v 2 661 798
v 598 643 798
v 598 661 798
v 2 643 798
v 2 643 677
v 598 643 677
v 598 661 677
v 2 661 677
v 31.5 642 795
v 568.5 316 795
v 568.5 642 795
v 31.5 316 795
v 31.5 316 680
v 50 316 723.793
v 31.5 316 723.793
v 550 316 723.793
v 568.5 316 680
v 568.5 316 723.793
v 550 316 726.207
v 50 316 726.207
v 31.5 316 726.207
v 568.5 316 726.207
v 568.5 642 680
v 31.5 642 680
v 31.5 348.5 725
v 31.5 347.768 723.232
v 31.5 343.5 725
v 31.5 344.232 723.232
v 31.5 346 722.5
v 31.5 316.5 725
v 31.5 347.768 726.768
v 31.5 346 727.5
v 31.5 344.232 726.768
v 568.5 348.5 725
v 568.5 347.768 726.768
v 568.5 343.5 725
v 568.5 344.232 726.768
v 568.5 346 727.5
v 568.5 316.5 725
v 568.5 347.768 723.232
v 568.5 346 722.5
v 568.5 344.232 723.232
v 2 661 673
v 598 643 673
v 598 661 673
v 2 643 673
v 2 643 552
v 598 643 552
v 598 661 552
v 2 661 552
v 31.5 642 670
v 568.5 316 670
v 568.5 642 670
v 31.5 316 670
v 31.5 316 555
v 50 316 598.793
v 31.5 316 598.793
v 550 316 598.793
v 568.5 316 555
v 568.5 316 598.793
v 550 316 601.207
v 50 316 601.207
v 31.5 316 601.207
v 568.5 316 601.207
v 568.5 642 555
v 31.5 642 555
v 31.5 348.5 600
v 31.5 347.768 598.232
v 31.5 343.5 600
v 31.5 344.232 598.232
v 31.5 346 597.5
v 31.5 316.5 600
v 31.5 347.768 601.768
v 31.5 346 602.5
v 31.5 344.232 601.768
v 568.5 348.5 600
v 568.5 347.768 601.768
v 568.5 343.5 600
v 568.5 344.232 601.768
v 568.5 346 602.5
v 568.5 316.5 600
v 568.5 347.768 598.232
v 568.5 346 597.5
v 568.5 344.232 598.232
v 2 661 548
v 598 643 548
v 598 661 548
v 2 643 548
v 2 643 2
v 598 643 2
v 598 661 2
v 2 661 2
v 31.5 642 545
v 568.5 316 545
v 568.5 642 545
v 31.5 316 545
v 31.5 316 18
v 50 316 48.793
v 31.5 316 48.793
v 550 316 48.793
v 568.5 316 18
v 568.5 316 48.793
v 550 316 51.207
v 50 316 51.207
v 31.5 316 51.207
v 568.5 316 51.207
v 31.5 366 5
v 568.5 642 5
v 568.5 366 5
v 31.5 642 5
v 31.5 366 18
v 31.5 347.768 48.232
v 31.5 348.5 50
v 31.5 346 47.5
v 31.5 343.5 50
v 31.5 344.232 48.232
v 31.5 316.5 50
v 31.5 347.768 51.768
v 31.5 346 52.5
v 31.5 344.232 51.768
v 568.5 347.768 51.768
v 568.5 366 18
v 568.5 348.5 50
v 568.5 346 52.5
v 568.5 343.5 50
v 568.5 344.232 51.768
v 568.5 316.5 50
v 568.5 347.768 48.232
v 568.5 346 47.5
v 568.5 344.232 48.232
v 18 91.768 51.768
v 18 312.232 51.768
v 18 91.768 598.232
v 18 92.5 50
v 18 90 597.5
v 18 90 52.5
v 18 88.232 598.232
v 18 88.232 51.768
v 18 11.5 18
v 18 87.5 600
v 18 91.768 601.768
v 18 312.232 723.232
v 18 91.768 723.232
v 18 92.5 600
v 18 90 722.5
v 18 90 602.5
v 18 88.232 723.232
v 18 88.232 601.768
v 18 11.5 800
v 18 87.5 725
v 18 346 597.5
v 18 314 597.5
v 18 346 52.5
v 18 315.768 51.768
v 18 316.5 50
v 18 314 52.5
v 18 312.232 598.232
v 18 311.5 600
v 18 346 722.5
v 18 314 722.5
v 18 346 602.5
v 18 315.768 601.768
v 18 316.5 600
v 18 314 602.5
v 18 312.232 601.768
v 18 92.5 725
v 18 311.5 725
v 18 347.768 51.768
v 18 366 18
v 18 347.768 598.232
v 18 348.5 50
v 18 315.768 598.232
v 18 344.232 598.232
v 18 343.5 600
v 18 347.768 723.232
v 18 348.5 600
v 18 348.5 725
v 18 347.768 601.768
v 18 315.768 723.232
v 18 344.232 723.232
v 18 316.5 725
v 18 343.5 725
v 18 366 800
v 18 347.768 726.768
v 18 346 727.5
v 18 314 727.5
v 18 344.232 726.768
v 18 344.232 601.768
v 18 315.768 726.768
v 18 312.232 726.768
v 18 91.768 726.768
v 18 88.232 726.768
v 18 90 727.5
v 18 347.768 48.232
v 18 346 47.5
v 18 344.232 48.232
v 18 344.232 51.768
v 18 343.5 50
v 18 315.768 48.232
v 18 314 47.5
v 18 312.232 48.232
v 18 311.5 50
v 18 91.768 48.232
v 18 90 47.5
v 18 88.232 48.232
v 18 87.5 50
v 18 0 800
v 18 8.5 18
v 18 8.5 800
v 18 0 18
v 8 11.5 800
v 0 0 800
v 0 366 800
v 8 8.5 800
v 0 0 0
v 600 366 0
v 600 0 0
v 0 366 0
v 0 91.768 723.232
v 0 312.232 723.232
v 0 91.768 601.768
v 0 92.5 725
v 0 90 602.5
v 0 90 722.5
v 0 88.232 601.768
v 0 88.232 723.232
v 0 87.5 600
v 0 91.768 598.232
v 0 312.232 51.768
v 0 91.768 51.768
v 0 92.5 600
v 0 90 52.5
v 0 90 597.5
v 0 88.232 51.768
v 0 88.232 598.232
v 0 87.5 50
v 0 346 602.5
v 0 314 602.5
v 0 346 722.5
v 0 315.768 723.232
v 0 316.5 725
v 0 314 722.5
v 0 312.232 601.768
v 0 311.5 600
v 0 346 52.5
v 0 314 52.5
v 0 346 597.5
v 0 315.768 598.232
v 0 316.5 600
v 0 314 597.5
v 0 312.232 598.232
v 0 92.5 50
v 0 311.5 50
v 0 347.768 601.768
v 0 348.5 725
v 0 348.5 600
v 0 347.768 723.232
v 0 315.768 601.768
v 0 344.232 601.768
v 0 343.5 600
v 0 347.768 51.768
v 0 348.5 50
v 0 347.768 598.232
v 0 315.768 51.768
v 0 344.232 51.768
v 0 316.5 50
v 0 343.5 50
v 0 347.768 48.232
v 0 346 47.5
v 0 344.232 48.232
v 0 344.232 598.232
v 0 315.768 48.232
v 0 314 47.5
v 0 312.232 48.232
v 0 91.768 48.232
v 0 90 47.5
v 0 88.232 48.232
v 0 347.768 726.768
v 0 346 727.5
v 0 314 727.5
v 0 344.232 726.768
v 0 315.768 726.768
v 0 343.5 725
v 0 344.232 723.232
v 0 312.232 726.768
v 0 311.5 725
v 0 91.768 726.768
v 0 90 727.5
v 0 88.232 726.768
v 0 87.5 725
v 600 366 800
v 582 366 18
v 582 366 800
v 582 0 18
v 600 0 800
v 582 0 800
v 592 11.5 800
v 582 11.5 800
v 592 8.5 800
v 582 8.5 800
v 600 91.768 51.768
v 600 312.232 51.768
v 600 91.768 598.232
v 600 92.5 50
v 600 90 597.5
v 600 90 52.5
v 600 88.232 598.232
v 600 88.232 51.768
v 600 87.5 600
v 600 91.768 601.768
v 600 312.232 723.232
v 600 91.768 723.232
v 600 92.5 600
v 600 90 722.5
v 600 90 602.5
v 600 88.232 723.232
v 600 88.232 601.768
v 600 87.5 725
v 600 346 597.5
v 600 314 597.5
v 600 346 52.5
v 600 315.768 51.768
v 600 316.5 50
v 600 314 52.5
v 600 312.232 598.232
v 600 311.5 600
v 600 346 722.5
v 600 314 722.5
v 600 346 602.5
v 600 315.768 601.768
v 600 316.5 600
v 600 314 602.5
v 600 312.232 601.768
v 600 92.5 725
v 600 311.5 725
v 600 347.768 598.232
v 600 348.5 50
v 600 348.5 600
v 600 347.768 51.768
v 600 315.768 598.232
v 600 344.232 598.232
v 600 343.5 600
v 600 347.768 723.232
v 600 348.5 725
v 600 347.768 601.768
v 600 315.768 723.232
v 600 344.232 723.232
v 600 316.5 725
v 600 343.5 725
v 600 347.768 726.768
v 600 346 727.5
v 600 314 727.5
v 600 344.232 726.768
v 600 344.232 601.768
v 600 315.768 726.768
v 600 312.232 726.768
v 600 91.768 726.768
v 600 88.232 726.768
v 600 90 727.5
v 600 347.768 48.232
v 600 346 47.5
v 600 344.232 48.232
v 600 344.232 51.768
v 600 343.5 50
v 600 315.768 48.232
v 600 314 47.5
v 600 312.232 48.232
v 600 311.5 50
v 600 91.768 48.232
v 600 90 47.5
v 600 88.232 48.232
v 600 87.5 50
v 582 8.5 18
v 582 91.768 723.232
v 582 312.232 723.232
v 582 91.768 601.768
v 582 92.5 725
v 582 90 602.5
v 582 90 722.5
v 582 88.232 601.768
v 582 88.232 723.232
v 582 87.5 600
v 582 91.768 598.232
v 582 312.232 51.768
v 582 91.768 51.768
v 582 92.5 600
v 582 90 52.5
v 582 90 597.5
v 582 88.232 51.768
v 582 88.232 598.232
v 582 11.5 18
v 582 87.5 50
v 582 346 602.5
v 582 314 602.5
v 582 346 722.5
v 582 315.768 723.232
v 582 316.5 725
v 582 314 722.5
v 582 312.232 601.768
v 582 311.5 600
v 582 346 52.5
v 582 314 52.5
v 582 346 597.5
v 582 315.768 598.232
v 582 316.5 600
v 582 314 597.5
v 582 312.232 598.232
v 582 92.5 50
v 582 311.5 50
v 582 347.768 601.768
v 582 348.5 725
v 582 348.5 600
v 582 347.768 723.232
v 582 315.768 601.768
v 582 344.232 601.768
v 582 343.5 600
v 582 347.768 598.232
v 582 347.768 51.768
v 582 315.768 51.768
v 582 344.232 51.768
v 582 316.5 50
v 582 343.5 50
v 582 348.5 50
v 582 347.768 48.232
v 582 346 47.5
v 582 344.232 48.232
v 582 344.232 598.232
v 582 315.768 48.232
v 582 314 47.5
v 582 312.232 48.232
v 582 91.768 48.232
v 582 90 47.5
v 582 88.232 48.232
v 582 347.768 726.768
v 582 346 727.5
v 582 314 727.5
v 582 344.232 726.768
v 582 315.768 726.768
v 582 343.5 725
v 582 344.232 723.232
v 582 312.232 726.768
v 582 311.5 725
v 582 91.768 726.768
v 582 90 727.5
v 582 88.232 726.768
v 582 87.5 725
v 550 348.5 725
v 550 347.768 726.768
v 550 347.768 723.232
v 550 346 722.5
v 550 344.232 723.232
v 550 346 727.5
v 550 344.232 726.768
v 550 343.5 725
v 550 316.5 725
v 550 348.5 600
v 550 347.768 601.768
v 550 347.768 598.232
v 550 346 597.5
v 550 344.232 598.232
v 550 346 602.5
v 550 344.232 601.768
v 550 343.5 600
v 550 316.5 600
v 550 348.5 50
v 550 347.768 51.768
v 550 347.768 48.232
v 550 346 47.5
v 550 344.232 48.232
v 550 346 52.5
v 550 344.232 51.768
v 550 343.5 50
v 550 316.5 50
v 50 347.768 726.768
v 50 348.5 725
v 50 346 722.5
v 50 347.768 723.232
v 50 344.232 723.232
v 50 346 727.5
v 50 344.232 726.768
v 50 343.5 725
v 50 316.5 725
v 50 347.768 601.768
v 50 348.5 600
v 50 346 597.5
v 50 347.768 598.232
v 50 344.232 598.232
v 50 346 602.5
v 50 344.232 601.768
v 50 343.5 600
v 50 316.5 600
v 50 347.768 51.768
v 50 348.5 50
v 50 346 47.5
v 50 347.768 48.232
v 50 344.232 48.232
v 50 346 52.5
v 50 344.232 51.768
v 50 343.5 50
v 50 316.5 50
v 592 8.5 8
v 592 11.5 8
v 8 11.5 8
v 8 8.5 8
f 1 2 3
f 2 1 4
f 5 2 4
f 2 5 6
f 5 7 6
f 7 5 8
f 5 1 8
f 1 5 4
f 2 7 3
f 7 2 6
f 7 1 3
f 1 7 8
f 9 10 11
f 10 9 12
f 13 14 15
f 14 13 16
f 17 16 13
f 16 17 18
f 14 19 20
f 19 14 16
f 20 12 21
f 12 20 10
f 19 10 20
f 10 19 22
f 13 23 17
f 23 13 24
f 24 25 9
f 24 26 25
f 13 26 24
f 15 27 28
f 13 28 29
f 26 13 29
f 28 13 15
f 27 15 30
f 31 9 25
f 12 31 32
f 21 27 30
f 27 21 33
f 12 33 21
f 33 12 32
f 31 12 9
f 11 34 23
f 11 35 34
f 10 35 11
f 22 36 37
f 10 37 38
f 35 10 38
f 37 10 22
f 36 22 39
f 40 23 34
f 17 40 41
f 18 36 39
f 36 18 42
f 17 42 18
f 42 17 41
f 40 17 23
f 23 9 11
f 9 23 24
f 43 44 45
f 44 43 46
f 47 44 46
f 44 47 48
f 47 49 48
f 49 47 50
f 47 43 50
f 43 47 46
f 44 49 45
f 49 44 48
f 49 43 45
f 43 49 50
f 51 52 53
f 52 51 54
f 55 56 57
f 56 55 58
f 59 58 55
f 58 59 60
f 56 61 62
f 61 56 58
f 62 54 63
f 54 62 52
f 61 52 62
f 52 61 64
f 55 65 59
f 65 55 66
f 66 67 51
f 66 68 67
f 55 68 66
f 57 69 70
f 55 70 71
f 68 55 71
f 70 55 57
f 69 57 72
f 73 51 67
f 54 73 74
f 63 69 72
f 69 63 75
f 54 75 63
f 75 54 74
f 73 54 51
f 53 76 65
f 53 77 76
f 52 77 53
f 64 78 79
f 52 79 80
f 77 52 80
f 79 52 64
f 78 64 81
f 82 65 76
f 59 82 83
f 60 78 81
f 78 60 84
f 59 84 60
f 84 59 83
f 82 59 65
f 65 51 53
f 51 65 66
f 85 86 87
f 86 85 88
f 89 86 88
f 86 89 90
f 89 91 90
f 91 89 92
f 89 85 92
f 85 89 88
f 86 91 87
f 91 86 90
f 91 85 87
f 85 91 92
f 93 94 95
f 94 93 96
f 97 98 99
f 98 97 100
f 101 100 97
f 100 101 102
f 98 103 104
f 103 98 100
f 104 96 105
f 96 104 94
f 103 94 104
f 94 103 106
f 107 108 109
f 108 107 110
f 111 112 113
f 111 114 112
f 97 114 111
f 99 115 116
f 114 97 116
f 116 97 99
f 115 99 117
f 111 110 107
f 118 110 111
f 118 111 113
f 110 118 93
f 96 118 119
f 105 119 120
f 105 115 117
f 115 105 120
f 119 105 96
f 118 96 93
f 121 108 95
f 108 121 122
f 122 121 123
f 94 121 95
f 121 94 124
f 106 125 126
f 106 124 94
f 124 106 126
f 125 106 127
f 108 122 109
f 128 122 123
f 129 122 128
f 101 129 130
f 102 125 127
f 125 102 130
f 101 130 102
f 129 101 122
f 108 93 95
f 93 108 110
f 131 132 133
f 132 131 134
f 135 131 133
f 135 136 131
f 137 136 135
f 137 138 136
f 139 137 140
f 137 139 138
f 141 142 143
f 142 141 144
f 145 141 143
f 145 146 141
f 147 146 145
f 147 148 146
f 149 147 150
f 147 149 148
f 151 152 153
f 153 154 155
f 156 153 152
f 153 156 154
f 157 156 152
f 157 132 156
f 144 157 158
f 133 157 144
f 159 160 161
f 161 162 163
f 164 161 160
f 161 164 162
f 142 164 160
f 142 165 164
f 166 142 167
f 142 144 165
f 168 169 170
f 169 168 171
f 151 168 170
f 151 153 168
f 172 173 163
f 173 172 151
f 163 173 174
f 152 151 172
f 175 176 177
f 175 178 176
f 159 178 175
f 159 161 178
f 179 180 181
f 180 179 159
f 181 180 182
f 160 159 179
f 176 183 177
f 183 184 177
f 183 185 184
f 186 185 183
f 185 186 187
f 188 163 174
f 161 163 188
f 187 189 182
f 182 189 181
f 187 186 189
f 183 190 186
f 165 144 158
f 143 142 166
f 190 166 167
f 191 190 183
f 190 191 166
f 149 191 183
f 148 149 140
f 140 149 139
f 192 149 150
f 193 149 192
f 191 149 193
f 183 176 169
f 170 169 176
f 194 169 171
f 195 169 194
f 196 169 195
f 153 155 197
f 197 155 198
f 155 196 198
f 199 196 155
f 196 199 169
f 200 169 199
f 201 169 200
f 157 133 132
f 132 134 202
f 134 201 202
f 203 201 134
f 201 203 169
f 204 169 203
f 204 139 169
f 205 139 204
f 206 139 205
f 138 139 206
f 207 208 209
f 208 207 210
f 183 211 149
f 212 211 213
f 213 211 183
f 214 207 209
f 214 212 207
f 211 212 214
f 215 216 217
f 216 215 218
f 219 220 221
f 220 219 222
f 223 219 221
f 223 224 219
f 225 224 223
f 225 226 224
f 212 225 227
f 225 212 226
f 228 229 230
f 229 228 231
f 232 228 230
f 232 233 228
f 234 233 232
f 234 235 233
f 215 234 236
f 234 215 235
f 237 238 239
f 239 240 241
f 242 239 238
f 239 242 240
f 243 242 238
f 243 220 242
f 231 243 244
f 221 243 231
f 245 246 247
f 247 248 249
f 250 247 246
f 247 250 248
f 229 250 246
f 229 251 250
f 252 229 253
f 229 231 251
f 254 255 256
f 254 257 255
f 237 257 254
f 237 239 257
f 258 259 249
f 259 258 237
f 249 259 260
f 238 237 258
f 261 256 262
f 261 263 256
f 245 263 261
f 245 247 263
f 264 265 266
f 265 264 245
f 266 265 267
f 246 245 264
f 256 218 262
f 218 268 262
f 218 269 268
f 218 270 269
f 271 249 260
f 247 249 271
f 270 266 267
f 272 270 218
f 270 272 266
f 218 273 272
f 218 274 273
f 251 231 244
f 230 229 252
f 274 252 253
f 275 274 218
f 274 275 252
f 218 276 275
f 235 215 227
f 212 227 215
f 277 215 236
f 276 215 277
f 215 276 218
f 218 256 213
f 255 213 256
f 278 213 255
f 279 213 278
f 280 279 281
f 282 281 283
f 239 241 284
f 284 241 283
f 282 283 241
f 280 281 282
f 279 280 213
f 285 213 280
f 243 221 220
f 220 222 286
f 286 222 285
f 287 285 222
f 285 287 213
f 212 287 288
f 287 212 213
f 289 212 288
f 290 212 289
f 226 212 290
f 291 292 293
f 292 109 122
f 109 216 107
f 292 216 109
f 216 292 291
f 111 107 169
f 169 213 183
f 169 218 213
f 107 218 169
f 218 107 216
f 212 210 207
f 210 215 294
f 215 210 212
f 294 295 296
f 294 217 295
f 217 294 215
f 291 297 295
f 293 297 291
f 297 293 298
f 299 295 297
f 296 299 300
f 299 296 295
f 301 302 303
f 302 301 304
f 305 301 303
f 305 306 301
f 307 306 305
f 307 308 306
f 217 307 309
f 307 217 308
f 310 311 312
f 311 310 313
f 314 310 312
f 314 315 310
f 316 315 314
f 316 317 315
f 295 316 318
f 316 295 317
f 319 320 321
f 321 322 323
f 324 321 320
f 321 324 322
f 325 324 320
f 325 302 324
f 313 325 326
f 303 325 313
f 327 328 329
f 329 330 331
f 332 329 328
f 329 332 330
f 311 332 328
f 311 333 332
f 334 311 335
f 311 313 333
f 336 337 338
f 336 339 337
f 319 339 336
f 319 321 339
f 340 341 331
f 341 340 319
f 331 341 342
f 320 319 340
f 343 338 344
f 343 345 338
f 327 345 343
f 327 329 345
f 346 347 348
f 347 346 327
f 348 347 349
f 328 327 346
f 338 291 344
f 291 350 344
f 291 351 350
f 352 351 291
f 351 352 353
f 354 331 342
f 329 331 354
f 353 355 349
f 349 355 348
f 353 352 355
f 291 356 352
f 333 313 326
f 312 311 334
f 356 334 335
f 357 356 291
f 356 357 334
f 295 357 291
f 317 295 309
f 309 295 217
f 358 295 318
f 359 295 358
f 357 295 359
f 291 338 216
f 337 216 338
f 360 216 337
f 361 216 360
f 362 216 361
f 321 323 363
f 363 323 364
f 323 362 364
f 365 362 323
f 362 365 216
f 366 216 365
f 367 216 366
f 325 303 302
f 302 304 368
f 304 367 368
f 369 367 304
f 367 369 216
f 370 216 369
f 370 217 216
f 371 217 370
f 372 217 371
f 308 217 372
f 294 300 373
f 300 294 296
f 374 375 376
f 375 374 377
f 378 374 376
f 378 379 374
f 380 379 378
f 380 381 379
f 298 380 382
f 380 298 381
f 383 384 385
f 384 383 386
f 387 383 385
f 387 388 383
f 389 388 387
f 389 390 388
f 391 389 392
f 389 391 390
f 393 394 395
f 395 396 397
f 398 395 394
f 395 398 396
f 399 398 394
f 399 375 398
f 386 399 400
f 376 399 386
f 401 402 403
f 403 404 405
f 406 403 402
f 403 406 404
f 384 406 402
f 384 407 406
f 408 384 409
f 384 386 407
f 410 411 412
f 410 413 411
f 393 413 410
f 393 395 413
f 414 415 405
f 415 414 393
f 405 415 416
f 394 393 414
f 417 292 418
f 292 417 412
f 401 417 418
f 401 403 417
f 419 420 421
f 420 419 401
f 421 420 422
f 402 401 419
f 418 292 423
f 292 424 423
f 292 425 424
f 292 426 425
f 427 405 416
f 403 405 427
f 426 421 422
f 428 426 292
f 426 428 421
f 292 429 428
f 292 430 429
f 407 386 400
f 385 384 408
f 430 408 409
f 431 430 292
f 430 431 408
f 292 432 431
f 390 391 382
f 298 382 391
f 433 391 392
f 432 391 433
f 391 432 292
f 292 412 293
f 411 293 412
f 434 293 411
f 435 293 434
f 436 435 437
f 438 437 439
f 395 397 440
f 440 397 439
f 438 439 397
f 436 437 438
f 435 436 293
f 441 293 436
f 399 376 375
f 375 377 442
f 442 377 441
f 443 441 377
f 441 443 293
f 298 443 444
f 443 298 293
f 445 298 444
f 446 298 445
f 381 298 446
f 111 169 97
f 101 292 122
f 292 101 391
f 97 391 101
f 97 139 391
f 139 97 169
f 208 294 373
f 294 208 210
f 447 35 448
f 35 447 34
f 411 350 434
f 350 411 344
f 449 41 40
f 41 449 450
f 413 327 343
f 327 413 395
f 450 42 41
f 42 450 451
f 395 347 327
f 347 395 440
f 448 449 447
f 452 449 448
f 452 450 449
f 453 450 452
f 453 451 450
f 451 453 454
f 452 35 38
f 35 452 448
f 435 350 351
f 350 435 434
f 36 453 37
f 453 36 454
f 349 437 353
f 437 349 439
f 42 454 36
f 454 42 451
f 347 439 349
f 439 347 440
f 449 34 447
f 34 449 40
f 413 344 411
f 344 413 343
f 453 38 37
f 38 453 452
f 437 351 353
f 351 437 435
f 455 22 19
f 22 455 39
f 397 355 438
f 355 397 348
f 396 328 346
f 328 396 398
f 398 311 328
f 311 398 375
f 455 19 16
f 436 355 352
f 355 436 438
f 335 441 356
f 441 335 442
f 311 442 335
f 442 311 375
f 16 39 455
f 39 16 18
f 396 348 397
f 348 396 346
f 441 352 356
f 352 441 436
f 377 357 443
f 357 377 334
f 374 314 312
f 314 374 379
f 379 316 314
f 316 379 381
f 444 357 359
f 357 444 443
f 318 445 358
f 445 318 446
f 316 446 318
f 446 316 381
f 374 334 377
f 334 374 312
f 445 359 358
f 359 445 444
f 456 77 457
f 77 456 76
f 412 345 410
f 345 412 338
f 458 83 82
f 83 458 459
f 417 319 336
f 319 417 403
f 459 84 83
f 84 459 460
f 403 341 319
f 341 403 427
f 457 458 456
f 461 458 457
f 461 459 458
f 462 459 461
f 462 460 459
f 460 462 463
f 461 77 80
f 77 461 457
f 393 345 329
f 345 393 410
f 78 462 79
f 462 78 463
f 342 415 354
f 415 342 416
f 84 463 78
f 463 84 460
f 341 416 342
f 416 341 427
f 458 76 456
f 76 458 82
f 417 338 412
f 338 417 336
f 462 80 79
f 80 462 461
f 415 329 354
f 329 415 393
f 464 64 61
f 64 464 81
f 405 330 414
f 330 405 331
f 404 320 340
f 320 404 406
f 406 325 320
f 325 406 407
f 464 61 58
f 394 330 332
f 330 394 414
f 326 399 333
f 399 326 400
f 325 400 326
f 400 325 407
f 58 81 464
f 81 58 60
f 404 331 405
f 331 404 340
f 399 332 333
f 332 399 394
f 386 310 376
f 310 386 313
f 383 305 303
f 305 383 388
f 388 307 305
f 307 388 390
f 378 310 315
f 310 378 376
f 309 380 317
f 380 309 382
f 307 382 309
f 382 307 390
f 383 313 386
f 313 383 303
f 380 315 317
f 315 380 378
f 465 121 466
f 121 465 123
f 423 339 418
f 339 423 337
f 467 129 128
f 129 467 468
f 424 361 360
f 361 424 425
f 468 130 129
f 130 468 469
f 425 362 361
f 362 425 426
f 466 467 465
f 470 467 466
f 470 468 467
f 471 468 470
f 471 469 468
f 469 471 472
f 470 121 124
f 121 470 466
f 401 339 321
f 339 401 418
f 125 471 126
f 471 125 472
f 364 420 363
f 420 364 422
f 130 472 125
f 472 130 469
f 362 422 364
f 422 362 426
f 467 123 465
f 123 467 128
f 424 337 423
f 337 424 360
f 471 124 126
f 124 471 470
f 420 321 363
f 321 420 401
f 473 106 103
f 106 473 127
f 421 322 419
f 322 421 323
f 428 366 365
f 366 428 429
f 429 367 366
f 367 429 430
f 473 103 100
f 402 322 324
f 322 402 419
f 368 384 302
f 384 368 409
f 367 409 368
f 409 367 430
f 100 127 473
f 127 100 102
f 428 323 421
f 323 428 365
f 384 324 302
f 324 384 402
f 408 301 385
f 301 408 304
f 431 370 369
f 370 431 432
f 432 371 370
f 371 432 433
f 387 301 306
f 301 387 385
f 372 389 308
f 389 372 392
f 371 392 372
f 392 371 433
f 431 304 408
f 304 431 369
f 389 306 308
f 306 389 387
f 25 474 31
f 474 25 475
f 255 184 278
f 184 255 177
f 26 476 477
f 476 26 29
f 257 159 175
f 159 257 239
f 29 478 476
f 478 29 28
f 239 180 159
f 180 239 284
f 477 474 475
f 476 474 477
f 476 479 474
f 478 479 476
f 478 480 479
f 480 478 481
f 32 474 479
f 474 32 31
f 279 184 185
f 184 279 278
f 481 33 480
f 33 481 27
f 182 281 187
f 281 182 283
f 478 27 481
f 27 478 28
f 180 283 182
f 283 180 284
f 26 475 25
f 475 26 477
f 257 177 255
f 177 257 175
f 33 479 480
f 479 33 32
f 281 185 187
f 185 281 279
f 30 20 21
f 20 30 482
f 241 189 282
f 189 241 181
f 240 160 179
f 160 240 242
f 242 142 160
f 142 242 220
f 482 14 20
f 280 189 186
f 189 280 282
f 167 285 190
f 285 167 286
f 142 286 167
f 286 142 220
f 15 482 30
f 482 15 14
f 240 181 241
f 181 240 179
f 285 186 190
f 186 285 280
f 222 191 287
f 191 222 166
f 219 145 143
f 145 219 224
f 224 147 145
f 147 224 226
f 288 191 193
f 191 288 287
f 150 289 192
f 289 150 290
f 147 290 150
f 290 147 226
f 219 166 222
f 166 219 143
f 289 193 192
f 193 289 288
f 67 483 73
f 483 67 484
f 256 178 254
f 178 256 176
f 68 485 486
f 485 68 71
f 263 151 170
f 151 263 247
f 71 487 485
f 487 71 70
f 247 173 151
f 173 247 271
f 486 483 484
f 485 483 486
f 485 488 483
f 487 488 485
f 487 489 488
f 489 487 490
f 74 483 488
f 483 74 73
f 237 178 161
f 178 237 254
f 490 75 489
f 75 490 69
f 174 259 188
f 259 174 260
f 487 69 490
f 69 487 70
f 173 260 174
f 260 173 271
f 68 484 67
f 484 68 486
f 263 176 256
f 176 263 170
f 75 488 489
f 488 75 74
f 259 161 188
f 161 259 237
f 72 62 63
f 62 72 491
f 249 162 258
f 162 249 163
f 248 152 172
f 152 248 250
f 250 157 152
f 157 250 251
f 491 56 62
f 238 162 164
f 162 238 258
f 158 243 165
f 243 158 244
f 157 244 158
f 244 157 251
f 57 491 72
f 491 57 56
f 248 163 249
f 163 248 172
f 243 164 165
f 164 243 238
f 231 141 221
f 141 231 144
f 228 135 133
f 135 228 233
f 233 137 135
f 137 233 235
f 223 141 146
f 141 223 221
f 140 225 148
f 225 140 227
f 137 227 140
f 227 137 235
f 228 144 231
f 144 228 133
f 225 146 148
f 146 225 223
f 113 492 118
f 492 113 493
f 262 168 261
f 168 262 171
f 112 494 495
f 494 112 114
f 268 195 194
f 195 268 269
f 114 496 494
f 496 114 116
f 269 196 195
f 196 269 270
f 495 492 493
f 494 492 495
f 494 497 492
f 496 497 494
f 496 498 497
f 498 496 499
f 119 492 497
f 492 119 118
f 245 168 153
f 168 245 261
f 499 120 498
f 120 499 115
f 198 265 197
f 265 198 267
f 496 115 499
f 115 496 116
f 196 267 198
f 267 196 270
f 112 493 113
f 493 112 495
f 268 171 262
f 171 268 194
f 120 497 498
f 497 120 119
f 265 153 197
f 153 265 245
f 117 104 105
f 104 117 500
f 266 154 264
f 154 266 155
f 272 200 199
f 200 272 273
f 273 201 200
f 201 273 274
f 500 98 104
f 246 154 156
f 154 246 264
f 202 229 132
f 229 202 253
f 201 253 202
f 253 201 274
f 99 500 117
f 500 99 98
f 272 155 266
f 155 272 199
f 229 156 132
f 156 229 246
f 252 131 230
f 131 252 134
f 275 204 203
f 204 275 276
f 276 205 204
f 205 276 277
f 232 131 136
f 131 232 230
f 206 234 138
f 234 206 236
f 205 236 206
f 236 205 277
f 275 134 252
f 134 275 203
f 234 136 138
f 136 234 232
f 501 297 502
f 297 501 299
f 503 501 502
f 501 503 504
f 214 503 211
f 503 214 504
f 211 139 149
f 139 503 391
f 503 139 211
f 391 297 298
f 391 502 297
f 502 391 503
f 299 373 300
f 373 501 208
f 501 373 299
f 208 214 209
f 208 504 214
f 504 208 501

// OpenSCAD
// file: syms.scad
module symY(t) {
    translate(t)
        children();
    mirror([0,1,0])
        translate(t)
            children();
}
module symX(t) {
    translate(t)
        children();
    mirror([1,0,0])
        translate(t)
            children();
}

module symZ(t) {
    translate(t)
        children();
    mirror([0,0,1])
        translate(t)
            children();
}

module	symXY(t) {
	tx=t[0];
	ty=t[1];
	tz=t[2];
	symX([tx,0,0])
	symY([0,ty,tz])
		children();
}

module magnetCut(D,S) {
    cylinder(d=D,h=10);
    for(d=[45,-45])
    rotate(d)
    cube([2*D,S,30],center=true);
}


// calculates the radius from "segment" paramers:
// https://en.wikipedia.org/wiki/Circular_segment
function    circleSlice2radius2(c,h) = (c*c/8/h)+ h/2;

function toInt(str) = 
    let(d = [for (s = str) ord(s) - 48], l = len(d) - 1)
    [for (i = 0, a = d[i];i <= l;i = i + 1, a = 10 * a + d[i]) a][l];
        
// main file
use <syms.scad>

W=18;

function prop(k,v)=[k,v];
function sublist(l,start)=start<len(l) ? [for(i=[start:len(l)-1])  l[i]] : undef;
function getProp(props,k)= (props[0][0] == k) ? props[0][1] : (props == undef ? 
    undef : getProp(sublist(props,1), k)
);


INSET=10;
BACKSET=10;
BACKPLANE_W=1.6;
BACKPLANE_NUT_W=2;

module bBox(e) {
    
    $inner_w=$width-2*W;
    
//    backplaneCenter=[0,depth-3,height/2+W-INSET]
    
    sidePos=-[$width/2-W/2,-$depth/2,-$height/2];

    module element(piece) {
        
        difference() {
            union() {
                if(piece=="R" || piece=="A")
                translate(sidePos)
                cube([W,$depth,$height],center=true);
                if(piece=="L" || piece=="A")
                mirror([1,0,0])
                translate(sidePos)
                cube([W,$depth,$height],center=true);
                if(piece=="B" || piece=="A")
                translate([0,$depth/2,W/2])
                cube([$inner_w,$depth,W],center=true);
                
                if(piece=="A") {
                    $mode="PREVIEW";
                    translate([0,$depth,$height])
                        children();
                }
            }
            
            
            translate([0,BACKSET,$height/2+W-INSET])
            cube([$inner_w+INSET*2,3,$height],center=true);

            $mode="HOLES";
            symX([$width/2,$depth,$height])
                children();
            
        }
    }
    
    if(e=="L") 
        rotate(90,[0,1,0])
        translate(sidePos)
        element(e)
            children();
    if(e=="R") 
        rotate(-90,[0,1,0])
        translate(-sidePos)
        element(e)
            children();
    if(e=="B")
        translate([0,0,-W/2])
        element(e)
            children();
    if(e=="A")
        translate([$width/2,0*$depth,0])
        element(e)
            children();
 //   element(e);
    
}

function abs(x) = x<0?-x:x;
function prefix(s,p)=(len(p)==0 || p==undef)?[]:concat([s+p[0]], prefix(s+p[0],sublist(p,1)) );

module maximera(sizes) {
    HOLE_D=5;
    C0=[    20,
            32,
            224,
            224
    ];
    
    C1=prefix(0,C0);
    
    x=prefix(0,[for(i=sizes) abs(i)]);
    for(i=[0:len(sizes)-1]) {
        off=x[i];
        size=sizes[i];
        
        if($mode=="HOLES") {
            for(x=C1)
                translate([0,-x,-off+50]) {
                rotate(90,[0,1,0])
                cylinder(d=HOLE_D,h=100,center=true);
            }
        }else{
            D=$depth-40;
            o_y=($drawerState=="CLOSED" ? 0 : D-50);
            translate([0,o_y,0]) {
            color([0,1,0])
                hull()
                symX([$width/2,0,0])
                translate([-W/4-2,W/2+1,-off+size-size/2])
                cube([W/2,W,size-4],center=true);

            color([1,0,0])
                hull()
                symX([$width/2-2*W,-D/2,-off+size/2])
                cube([W/2,D,size-10],center=true);
            }
            
//            cube(100);
            // front
        }
        
        
    }
}


module m60(pos,sizes) {
    $width=600;
    $drawerState="CLOSED";
    translate(pos)
    translate([$width/2,$depth,0])
    m60_0(sizes);
}

FRONT_SP=2;


module m60a(size) {
    m60([0,0,0],[size]);
    $depth=D37;
    
    translate([0,0,-size])
    children();
}

module m60b(size) {
    m60([0,0,0],[size]);
    $depth=D60;
    
    translate([0,0,-size])
    children();
}

module m60b(size) {
    m60([0,0,0],[size]);
    
    translate([0,0,-size])
    children();
}



module m60_0(sizes) {
    HOLE_D=5;
    C0=[    20,
            32,
            224,
            224
    ];
    
    C1=prefix(0,C0);
    
    x=prefix(0,[for(i=sizes) abs(i)]);
    for(i=[0:len(sizes)-1]) {
        off=x[i];
        size=sizes[i];
        
        if(!$positive) {
            for(x=C1)
                symX([$width/2,0,0])
                translate([0,-x,-off+50]) {
                rotate(90,[0,1,0])
                cylinder(d=HOLE_D,h=100,center=true);
            }
        }else{
            D=$depth-40;
            o_y=($drawerState=="CLOSED" ? 0 : D-50);
            if($fronts)
            translate([0,o_y,0]) {
            color([0,1,0]) {
//                translate([-W/4-2,W/2+1,-off+size-size/2])
                translate([0,W/2+1,-off+size/2])
                cube([$width-FRONT_SP,W,size-FRONT_SP],center=true);
                if(false)
                hull() {
                    OFF_L=0;//$thinL? W/2:0;
                    OFF_R=0;//$thinR? W/2:0;
                    symX([$width/2,0,0])
                    translate([-W/4-2,W/2+1,-off+size-size/2])
                    cube([W/2,W,size-4],center=true);
                }
            }

            if($machines)
            color([1,0,0])
                hull()
                symX([$width/2-2*W,-D/2,-off+size/2])
                cube([W/2,D,size-10],center=true);
            }
            
//            cube(100);
            // front
        }
        
        
    }
}


module z() {
    children();
}

D60=590;
D37=366;

mode="A";
bBox($width=600,$height=800,$depth=D37,mode) {
    $drawerState="OPEN";
    sizes=[125,125,550];
    maximera(sizes);
}
